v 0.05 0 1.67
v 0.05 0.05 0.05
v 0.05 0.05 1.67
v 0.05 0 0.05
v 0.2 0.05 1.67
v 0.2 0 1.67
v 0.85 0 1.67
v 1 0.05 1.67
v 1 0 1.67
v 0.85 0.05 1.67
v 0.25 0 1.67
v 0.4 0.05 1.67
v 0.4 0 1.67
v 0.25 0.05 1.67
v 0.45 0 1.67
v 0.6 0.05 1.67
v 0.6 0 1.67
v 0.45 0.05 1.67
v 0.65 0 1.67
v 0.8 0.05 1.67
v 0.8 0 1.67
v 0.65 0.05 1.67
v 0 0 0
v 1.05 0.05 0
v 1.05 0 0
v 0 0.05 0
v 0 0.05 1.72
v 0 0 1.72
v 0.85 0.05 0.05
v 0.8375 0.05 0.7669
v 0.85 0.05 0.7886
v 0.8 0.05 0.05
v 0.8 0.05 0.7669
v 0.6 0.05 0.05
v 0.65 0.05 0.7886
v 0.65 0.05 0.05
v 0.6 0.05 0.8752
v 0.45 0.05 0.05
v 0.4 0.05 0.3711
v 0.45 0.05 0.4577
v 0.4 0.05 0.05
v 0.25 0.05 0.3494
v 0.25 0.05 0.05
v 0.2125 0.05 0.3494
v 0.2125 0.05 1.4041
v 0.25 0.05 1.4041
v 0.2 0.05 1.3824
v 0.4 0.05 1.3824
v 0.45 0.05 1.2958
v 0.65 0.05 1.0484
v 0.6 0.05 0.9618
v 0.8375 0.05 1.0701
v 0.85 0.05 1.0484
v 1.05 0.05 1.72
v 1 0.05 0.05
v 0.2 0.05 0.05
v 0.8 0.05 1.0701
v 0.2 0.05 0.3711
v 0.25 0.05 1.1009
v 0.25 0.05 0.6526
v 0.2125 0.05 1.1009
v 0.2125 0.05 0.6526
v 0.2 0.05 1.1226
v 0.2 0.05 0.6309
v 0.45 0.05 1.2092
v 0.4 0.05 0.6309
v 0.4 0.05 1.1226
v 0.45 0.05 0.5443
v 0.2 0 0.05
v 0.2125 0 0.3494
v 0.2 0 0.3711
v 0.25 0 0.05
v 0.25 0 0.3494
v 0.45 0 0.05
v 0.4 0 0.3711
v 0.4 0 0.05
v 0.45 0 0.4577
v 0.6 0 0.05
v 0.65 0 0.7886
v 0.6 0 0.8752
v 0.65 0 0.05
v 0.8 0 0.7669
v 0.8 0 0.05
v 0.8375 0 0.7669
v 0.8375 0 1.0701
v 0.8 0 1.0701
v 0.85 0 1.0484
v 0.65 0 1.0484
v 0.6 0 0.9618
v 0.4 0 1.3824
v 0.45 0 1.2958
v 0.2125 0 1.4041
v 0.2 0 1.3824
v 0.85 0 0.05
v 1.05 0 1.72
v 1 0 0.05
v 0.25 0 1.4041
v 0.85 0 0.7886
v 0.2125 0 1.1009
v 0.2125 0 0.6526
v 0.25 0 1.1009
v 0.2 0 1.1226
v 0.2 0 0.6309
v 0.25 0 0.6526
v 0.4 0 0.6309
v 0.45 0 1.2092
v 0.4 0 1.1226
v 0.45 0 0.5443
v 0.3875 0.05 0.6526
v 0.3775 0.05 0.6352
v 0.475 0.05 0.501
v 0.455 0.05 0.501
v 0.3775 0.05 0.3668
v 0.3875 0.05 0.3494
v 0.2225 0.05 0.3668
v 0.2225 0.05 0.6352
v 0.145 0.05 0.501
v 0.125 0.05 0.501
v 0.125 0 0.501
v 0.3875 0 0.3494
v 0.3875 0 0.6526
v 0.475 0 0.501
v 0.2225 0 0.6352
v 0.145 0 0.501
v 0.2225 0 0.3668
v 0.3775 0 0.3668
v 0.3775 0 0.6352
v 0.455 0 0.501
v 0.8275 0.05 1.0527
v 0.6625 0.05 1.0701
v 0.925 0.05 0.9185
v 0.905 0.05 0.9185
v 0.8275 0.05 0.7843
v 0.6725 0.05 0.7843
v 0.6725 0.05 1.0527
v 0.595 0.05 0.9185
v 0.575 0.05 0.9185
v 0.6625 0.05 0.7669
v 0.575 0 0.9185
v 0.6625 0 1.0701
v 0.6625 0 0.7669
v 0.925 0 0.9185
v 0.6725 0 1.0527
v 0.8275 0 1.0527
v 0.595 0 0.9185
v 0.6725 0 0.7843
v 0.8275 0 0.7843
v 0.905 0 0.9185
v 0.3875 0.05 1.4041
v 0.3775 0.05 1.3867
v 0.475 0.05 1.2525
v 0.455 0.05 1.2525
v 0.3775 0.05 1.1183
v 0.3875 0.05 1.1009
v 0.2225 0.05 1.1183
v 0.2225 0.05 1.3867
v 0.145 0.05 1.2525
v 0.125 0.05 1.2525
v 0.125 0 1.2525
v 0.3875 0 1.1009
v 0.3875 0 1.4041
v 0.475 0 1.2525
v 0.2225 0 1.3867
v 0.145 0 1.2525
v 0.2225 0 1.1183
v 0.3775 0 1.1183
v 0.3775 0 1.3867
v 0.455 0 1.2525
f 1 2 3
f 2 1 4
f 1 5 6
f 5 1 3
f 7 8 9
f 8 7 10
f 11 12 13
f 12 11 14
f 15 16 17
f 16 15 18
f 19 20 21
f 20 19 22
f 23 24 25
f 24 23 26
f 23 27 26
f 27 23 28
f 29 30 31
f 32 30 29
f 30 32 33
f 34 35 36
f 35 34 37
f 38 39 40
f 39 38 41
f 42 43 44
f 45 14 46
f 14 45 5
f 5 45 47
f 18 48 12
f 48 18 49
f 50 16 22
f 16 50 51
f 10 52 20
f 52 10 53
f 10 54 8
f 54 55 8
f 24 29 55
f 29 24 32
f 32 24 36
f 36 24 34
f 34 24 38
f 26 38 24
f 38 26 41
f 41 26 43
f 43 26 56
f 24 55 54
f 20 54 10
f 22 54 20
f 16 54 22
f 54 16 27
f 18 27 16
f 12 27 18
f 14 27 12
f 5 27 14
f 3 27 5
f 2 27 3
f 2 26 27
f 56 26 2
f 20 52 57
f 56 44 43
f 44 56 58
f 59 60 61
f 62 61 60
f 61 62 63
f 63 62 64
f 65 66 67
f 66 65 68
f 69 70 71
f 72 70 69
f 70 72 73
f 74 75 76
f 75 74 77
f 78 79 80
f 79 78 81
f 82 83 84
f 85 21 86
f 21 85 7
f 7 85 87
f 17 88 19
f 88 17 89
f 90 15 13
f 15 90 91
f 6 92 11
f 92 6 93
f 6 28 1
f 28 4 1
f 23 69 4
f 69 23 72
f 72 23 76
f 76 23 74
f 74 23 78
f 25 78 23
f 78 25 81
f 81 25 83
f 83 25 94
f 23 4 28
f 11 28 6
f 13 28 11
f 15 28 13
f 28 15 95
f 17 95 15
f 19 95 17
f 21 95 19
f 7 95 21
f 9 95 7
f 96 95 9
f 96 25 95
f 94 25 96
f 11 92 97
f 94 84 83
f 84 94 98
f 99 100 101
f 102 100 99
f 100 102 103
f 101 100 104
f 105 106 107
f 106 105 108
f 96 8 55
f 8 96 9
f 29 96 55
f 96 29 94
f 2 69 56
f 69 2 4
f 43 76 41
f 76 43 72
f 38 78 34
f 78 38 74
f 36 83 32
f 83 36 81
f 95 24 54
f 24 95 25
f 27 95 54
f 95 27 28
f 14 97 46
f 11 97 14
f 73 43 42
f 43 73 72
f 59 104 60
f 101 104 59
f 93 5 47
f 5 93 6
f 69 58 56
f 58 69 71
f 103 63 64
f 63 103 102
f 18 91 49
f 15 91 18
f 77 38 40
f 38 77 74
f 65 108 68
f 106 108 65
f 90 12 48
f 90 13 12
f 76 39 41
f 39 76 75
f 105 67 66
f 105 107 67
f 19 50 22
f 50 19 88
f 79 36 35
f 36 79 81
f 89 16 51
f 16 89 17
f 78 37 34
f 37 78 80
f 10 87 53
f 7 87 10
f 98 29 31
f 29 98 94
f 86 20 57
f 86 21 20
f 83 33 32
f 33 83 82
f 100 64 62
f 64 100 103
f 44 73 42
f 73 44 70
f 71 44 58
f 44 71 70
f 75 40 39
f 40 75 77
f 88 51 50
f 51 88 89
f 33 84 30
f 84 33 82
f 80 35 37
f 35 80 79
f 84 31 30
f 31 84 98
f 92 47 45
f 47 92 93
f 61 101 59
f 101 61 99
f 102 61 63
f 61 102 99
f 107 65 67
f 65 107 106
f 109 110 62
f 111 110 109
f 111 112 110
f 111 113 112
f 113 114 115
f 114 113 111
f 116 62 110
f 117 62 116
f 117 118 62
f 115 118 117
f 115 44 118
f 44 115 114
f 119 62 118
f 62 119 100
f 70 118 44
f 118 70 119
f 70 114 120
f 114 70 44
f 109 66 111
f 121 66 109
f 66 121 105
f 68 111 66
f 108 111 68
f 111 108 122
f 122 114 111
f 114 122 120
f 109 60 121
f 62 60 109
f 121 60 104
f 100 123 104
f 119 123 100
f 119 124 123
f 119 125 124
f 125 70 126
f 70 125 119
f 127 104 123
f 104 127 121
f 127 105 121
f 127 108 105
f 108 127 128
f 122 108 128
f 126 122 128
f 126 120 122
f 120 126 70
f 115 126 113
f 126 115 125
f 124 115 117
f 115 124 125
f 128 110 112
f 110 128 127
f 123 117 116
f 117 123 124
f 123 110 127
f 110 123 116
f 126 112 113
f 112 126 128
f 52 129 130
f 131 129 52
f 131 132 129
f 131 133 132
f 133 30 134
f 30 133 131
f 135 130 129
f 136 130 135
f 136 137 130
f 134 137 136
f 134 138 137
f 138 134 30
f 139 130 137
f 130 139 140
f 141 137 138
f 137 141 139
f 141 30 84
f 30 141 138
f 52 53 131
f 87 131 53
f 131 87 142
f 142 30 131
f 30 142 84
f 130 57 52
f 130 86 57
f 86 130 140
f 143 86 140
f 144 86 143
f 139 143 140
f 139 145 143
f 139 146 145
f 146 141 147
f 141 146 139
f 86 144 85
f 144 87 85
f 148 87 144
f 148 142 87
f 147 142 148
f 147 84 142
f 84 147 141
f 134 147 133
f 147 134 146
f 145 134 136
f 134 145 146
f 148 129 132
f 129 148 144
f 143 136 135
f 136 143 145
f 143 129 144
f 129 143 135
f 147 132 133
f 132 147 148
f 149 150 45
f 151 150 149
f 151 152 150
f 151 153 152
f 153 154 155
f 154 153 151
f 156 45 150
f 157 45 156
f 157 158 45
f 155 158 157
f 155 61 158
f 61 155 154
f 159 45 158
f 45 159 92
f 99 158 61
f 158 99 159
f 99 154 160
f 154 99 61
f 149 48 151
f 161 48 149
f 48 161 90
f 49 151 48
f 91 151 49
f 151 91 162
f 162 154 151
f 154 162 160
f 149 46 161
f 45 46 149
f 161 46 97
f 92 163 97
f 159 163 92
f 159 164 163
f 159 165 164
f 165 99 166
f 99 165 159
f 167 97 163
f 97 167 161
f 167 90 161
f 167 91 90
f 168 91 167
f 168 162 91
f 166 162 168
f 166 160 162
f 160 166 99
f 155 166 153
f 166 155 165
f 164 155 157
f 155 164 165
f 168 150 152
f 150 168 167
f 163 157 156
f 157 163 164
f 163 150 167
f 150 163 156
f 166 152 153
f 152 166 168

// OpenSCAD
$fn = 6;

claustra_x = 1;
claustra_y = 0.05;
claustra_z = 1.67;

framing(claustra_x,claustra_y,claustra_z);
difference()
{
    beams(claustra_x, claustra_y, claustra_z, 5);
    
translate([claustra_x*0.3, claustra_y, claustra_z*0.3])
    rotate([90, 0, 0])
        hexagon(claustra_y, claustra_y*2, claustra_y);

translate([claustra_x*0.75, claustra_y, claustra_z*0.55])
    rotate([90, 0, 0])
        hexagon(claustra_y, claustra_y*2, claustra_y);

translate([claustra_x*0.3, claustra_y, claustra_z*0.75])
    rotate([90, 0, 0])
        hexagon(claustra_y, claustra_y*2, claustra_y);
}


translate([claustra_x*0.3, claustra_y, claustra_z*0.3])
    rotate([90, 0, 0])
        beehive(claustra_y, claustra_y*2, claustra_y);

translate([claustra_x*0.75, claustra_y, claustra_z*0.55])
    rotate([90, 0, 0])
        beehive(claustra_y, claustra_y*2, claustra_y);

translate([claustra_x*0.3, claustra_y, claustra_z*0.75])
    rotate([90, 0, 0])
        beehive(claustra_y, claustra_y*2, claustra_y);

module beams(x, y, h, n)
{
    for(i = [0: x/n: x])
    {
        translate([i, 0, 0])
            cube([y,y,h]);
    }
}

module framing(l, L, h)
{
    cube([L,L,h]);
    cube([l,L,L]);
    translate([l, 0, 0])
        cube([L,L,h]);
    translate([0, 0, h])
        cube([l+L,L,L]);
}

module vgrid(l, L, h)
{
    N = 10;
    step = l/N;
    for(i=[0: l/N :l])
    {
        translate([i*step, L, h])
            cube([1, 1, 1]);
    }
}

module hexagon(w, r, h)
{
    hull()
    {
        translate([w/2-r,0,0])
            cylinder(r=r, h=h);
        rotate([0,0,60])
            translate([w/2-r,0,0])
                cylinder(r=r, h=h);
        rotate([0,0,120])
            translate([w/2-r,0,0])
                cylinder(r=r, h=h);
        rotate([0,0,180])
            translate([w/2-r,0,0])
                cylinder(r=r, h=h);
        rotate([0,0,240])
            translate([w/2-r,0,0])
                cylinder(r=r, h=h);
        rotate([0,0,300])
            translate([w/2-r,0,0])
                cylinder(r=r, h=h);
    }
}

module beehive(w, r, h)
{
    difference(){
        hexagon(w, r, h);
        hexagon(w, r-r/10, h+1);
    }
}
